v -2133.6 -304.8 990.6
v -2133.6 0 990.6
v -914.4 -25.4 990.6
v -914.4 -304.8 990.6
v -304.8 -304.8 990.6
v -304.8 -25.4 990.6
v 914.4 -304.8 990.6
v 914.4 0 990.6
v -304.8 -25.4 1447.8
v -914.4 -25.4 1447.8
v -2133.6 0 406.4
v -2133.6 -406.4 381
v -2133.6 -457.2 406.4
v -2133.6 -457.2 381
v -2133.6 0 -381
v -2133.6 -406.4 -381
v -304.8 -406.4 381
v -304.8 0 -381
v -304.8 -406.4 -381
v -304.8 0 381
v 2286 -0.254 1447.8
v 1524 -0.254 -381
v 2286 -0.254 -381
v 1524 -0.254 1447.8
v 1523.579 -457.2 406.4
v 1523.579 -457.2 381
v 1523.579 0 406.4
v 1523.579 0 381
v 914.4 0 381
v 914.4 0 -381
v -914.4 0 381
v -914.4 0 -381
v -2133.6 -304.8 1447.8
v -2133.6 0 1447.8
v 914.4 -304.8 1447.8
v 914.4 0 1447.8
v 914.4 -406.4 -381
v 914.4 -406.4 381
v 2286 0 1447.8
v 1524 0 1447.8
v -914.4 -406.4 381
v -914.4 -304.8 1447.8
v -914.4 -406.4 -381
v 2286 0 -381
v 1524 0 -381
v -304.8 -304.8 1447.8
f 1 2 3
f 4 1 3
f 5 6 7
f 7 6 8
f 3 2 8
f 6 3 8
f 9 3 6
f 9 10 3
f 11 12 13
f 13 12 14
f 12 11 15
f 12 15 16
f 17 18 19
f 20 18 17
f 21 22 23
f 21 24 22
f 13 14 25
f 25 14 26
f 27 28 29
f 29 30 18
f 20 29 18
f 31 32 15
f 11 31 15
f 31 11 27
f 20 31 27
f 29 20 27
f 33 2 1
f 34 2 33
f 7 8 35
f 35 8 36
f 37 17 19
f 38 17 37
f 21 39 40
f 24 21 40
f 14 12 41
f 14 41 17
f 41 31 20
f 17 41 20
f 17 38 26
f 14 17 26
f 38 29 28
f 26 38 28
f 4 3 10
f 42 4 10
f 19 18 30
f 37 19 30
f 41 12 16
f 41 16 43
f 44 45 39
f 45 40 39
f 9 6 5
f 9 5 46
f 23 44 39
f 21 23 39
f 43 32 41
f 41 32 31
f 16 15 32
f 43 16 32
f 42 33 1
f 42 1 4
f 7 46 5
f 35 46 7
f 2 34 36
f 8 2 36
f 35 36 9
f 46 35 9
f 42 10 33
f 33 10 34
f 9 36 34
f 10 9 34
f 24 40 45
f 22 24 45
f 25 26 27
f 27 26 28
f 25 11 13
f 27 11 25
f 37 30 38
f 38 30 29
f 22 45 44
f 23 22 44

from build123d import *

# Parameters (mm, degrees)
F0_W     = 609.6
F0_H     = 762
F1_DEPTH = 406.4
F2_DEPTH = 0.254
F0_H_2   = 457.2
F3_DEPTH = 304.8
F4_W     = 1219.2
F4_H     = 406.4
F5_DEPTH = 25.4
F6_DEPTH = 25.4


with BuildPart() as f1:
    # F0 (on Front) → F1 (new body)
    with BuildSketch(Plane.XZ):
        with Locations((609.6, 0)):
            Rectangle(F0_W, F0_H)
        Rectangle(F0_W, F0_H)
    extrude(amount=F1_DEPTH)



with BuildPart() as f1b:
    # F0 (on Front) → F1, piece 2 (new body)
    with BuildSketch(Plane.XZ):
        with Locations((-1828.8, 0)):
            Rectangle(F0_W, F0_H)
        with Locations((-1219.2, 0)):
            Rectangle(F0_W, F0_H)
    extrude(amount=F1_DEPTH)


with BuildPart() as f2:
    # F0 (on Front) → F2 (new body)
    with BuildSketch(Plane.XZ):
        Polygon((1524, 381), (1524, -381), (2286, -381), (2286, 1447.8), (1524, 1447.8), (1524, 990.6), align=None)
    extrude(amount=F2_DEPTH)


with BuildPart() as f3:
    # F0 (on Front) → F3 (new body)
    with BuildSketch(Plane.XZ):
        with Locations((-1219.2, 1219.2)):
            Rectangle(F0_W, F0_H_2)
        with Locations((-1828.8, 1219.2)):
            Rectangle(F0_W, F0_H_2)
    extrude(amount=F3_DEPTH)



with BuildPart() as f3b:
    # F0 (on Front) → F3, piece 2 (new body)
    with BuildSketch(Plane.XZ):
        with Locations((609.6, 1219.2)):
            Rectangle(F0_W, F0_H_2)
        with Locations((0, 1219.2)):
            Rectangle(F0_W, F0_H_2)
    extrude(amount=F3_DEPTH)


with BuildPart() as f1_1:
    add(f1.part)

    add(f1b.part)  # F5 merges F1b
    # F4 (on face) → F5 (join)
    with BuildSketch(Plane.XY.offset(381)):
        Polygon((1523.5787630081, -457.2), (1523.5787630081, 0), (-914.4, 0), (-914.4, -406.4), (-2133.6, -406.4), (-2133.6, -457.2), align=None)
        with Locations((-1524, -203.2)):
            Rectangle(F4_W, F4_H)
    extrude(amount=F5_DEPTH)


with BuildPart() as f3_1:
    add(f3.part)

    add(f3b.part)  # F6 merges F3b
    # F0 (on Front) → F6 (join)
    with BuildSketch(Plane.XZ):
        with Locations((0, 1219.2)):
            Rectangle(F0_W, F0_H_2)
        with Locations((-609.6, 1219.2)):
            Rectangle(F0_W, F0_H_2)
    extrude(amount=F6_DEPTH)


solid = Compound([f2.part, f1_1.part, f3_1.part])
